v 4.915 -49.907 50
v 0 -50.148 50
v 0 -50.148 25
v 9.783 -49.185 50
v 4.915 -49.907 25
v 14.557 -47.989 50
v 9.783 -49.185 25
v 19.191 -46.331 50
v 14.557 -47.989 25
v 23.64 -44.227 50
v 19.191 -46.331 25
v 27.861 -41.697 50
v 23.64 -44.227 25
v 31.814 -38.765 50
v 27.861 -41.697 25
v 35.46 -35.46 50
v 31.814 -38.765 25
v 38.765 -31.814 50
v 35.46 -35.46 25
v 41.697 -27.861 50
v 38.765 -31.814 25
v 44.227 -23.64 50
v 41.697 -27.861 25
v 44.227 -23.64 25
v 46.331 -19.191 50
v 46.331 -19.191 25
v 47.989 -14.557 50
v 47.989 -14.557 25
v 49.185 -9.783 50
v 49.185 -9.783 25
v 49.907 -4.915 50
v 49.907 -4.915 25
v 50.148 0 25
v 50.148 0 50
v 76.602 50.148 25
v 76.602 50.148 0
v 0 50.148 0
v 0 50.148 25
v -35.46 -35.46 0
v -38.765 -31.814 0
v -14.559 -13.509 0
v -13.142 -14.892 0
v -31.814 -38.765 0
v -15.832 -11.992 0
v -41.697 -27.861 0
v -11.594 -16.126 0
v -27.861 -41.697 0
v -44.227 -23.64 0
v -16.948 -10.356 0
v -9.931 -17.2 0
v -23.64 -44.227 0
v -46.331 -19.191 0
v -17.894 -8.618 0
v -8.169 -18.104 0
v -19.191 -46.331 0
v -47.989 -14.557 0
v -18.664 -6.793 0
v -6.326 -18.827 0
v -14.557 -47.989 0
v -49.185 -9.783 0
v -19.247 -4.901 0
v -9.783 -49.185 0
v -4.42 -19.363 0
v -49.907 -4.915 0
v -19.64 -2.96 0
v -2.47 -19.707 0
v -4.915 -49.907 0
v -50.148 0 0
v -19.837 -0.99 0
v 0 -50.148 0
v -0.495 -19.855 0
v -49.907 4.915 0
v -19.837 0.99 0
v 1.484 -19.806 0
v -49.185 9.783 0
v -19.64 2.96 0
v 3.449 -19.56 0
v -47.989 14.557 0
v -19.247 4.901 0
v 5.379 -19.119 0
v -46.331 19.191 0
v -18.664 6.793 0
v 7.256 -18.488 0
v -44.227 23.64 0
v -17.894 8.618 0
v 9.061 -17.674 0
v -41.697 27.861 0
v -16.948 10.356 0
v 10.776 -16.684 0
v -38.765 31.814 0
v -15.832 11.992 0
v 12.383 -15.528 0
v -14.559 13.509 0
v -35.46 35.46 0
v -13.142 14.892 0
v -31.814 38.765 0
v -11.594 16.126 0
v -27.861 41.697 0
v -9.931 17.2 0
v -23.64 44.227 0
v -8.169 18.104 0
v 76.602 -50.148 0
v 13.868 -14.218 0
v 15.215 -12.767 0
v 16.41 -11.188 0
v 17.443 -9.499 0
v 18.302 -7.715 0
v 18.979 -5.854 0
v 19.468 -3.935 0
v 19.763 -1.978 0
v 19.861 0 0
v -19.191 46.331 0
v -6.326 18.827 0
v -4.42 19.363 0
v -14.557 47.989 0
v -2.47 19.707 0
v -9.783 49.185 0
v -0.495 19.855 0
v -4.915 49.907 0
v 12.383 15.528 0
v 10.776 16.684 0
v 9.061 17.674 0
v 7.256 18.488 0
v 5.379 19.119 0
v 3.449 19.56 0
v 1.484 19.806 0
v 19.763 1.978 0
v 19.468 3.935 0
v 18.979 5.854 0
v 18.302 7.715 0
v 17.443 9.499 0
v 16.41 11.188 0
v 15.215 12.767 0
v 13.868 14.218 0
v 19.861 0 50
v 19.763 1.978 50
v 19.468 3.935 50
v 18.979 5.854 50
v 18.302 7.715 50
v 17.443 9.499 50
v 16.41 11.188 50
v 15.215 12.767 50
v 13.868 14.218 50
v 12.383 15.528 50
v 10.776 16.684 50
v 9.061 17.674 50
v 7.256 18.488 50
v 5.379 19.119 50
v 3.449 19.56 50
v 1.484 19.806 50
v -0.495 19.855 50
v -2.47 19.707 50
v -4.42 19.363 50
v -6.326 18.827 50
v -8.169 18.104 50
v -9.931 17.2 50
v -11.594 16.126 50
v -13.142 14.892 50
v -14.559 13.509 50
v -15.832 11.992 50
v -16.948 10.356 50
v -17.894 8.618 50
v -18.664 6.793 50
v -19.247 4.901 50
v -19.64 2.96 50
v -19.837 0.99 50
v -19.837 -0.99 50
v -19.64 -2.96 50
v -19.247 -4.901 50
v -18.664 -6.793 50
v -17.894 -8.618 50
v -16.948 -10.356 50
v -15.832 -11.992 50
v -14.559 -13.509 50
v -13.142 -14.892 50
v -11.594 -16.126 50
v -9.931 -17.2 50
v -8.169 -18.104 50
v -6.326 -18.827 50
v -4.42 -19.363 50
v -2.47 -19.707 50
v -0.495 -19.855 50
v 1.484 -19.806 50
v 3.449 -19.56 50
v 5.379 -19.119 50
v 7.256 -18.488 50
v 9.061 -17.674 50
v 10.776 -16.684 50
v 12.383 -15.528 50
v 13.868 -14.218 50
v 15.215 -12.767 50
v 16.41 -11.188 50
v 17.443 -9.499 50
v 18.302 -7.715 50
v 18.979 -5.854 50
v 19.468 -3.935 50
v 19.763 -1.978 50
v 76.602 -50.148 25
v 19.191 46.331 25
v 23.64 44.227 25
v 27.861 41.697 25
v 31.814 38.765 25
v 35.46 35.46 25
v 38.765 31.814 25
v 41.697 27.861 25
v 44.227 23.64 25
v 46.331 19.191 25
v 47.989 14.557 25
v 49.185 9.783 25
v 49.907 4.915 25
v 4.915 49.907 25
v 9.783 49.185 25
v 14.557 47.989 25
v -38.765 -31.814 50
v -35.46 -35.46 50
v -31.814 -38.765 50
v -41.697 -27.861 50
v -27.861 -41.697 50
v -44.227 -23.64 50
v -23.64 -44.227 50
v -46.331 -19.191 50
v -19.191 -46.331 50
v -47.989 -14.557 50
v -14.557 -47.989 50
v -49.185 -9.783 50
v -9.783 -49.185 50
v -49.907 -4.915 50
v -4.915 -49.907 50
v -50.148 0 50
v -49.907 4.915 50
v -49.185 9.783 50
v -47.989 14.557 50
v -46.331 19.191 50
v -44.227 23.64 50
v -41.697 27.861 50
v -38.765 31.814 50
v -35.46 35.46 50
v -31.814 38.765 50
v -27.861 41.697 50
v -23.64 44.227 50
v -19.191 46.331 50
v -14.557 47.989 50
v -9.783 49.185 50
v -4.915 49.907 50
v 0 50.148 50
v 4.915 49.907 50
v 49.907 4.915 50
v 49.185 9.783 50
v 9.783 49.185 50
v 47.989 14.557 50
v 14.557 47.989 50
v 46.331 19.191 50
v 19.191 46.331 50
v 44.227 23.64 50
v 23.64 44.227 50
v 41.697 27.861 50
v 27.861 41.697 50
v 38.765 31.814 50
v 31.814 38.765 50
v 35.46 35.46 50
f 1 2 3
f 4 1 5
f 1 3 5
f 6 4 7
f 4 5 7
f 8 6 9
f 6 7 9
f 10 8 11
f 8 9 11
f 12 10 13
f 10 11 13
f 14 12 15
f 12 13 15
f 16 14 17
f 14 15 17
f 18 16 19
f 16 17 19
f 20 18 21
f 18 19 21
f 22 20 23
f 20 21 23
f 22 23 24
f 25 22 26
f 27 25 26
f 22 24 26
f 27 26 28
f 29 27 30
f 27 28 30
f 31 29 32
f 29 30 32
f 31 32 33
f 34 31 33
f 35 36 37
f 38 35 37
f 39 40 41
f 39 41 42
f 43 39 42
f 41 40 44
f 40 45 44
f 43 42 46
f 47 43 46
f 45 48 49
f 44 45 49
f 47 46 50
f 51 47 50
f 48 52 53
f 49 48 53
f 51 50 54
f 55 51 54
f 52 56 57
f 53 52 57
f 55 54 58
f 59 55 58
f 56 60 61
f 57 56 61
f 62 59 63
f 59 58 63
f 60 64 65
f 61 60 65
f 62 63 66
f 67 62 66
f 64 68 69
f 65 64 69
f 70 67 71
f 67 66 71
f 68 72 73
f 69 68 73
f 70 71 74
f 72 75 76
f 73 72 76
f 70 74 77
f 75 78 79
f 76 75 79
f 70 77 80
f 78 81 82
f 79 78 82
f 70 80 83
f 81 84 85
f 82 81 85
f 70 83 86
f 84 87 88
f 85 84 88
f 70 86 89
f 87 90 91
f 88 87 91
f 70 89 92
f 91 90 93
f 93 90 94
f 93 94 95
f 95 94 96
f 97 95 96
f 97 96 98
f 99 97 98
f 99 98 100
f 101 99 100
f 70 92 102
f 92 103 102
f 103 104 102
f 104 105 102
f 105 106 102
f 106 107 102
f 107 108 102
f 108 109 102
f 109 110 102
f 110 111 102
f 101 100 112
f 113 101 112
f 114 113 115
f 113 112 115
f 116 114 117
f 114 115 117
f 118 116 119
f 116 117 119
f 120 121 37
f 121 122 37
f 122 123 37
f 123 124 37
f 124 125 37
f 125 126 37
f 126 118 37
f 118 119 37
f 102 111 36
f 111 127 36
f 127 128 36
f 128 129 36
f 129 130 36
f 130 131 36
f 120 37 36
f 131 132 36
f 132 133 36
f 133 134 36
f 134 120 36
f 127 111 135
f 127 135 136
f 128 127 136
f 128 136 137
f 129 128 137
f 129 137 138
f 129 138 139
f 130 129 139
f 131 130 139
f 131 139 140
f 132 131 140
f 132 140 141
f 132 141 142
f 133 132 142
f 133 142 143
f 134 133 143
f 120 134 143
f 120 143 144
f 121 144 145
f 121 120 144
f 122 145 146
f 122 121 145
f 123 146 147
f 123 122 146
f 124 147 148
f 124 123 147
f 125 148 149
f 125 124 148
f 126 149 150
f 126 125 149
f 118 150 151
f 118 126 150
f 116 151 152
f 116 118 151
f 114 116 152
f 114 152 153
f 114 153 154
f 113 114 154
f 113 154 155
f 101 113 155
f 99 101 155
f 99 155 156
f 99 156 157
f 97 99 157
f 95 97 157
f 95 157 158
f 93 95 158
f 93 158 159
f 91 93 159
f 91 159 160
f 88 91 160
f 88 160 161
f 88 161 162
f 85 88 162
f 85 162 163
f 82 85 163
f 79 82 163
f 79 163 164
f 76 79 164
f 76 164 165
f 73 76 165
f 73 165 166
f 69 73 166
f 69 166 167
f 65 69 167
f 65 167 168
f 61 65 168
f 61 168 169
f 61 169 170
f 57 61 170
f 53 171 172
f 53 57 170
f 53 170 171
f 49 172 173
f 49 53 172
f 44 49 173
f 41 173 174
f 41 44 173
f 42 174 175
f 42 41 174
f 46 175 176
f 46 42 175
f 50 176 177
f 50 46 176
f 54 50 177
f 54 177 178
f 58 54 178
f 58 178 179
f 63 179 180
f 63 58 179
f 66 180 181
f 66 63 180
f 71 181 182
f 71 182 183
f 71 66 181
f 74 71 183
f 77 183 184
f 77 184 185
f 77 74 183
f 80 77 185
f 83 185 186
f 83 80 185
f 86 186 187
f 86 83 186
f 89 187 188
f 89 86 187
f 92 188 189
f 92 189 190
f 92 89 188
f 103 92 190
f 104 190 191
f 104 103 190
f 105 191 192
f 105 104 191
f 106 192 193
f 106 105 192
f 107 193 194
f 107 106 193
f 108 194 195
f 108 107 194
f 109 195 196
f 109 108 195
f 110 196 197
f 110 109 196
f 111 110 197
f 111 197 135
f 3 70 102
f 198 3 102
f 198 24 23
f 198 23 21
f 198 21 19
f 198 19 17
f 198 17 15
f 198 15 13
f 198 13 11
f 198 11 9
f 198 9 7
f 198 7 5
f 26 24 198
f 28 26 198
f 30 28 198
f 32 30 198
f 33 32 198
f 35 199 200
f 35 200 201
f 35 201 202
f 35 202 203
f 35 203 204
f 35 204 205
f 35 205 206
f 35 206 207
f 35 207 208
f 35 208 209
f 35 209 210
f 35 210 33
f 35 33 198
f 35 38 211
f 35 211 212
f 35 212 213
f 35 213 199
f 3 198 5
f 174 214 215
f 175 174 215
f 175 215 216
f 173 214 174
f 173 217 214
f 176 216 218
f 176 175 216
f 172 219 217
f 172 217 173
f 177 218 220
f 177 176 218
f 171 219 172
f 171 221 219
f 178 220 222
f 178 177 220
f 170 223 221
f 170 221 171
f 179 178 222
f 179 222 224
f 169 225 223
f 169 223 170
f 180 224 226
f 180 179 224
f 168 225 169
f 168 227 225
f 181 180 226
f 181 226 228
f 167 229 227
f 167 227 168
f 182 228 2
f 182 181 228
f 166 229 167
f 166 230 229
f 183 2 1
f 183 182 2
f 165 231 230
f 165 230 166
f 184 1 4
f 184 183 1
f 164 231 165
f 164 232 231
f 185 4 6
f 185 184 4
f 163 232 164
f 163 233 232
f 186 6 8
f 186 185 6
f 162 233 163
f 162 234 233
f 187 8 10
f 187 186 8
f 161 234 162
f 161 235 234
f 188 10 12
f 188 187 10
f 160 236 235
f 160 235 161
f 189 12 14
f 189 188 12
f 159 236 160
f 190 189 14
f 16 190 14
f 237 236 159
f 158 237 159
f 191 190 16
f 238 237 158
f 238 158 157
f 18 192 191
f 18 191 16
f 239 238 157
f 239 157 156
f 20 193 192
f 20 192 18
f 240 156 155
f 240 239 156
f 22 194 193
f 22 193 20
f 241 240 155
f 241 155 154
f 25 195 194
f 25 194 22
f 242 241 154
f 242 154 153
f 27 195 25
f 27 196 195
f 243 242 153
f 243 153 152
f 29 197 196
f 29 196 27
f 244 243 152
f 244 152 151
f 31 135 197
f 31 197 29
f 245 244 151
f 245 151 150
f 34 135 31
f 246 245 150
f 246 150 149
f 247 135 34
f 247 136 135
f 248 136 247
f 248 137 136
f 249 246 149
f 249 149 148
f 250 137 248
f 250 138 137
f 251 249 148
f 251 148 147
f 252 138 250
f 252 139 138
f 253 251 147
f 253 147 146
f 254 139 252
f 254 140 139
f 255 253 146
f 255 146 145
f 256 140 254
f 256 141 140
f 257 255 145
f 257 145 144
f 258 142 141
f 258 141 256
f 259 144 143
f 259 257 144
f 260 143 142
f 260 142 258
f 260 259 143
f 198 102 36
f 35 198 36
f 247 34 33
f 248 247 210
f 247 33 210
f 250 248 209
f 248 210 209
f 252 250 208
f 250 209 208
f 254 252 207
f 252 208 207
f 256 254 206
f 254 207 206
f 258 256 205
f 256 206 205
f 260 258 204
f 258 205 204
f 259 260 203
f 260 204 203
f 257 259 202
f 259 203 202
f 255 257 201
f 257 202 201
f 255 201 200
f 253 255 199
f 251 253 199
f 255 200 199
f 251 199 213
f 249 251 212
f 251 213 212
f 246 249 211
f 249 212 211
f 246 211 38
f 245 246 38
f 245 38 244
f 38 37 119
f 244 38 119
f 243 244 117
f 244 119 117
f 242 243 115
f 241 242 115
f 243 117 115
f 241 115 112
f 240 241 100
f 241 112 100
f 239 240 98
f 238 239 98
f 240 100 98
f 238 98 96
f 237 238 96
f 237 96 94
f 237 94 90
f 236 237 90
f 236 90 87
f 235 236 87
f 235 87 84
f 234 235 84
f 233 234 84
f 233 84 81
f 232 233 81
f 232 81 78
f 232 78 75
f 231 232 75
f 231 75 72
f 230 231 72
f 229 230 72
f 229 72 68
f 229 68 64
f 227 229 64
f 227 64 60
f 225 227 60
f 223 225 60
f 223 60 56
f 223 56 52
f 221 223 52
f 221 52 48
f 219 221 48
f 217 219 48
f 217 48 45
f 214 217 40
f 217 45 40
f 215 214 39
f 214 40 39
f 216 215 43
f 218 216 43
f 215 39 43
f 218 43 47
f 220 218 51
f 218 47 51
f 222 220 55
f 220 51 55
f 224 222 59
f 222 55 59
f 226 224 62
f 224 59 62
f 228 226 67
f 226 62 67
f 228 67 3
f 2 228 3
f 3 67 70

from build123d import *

# Parameters (mm, degrees)
F0_R     = 19.861396
F1_DEPTH = 50
F2_DEPTH = 25


with BuildPart() as f1:
    # F0 (on Top) → F1 (new body)
    with BuildSketch(Plane.XY):
        with BuildLine():
            ThreePointArc((0, -50.148256), (35.460172, -35.460172), (50.148256, 0))
            ThreePointArc((50.148256, 0), (35.460172, 35.460172), (0, 50.148256))
            ThreePointArc((0, 50.148256), (-50.148256, 0), (0, -50.148256))
        make_face()
        Circle(F0_R, mode=Mode.SUBTRACT)
    extrude(amount=F1_DEPTH)

    # F0 (on Top) → F2 (join)
    with BuildSketch(Plane.XY):
        with BuildLine():
            ThreePointArc((0, -50.148256), (35.460172, -35.460172), (50.148256, 0))
            ThreePointArc((50.148256, 0), (35.460172, 35.460172), (0, 50.148256))
            ThreePointArc((0, 50.148256), (-50.148256, 0), (0, -50.148256))
        make_face()
        Circle(F0_R, mode=Mode.SUBTRACT)
        with BuildLine():
            ThreePointArc((0, 50.148256), (35.460172, 35.460172), (50.148256, 0))
            ThreePointArc((50.148256, 0), (35.460172, -35.460172), (0, -50.148256))
            Line((0, -50.148256), (76.60187, -50.148256))
            Line((76.60187, -50.148256), (76.60187, 50.148256))
            Line((76.60187, 50.148256), (0, 50.148256))
        make_face()
    extrude(amount=F2_DEPTH)


solid = f1.part
